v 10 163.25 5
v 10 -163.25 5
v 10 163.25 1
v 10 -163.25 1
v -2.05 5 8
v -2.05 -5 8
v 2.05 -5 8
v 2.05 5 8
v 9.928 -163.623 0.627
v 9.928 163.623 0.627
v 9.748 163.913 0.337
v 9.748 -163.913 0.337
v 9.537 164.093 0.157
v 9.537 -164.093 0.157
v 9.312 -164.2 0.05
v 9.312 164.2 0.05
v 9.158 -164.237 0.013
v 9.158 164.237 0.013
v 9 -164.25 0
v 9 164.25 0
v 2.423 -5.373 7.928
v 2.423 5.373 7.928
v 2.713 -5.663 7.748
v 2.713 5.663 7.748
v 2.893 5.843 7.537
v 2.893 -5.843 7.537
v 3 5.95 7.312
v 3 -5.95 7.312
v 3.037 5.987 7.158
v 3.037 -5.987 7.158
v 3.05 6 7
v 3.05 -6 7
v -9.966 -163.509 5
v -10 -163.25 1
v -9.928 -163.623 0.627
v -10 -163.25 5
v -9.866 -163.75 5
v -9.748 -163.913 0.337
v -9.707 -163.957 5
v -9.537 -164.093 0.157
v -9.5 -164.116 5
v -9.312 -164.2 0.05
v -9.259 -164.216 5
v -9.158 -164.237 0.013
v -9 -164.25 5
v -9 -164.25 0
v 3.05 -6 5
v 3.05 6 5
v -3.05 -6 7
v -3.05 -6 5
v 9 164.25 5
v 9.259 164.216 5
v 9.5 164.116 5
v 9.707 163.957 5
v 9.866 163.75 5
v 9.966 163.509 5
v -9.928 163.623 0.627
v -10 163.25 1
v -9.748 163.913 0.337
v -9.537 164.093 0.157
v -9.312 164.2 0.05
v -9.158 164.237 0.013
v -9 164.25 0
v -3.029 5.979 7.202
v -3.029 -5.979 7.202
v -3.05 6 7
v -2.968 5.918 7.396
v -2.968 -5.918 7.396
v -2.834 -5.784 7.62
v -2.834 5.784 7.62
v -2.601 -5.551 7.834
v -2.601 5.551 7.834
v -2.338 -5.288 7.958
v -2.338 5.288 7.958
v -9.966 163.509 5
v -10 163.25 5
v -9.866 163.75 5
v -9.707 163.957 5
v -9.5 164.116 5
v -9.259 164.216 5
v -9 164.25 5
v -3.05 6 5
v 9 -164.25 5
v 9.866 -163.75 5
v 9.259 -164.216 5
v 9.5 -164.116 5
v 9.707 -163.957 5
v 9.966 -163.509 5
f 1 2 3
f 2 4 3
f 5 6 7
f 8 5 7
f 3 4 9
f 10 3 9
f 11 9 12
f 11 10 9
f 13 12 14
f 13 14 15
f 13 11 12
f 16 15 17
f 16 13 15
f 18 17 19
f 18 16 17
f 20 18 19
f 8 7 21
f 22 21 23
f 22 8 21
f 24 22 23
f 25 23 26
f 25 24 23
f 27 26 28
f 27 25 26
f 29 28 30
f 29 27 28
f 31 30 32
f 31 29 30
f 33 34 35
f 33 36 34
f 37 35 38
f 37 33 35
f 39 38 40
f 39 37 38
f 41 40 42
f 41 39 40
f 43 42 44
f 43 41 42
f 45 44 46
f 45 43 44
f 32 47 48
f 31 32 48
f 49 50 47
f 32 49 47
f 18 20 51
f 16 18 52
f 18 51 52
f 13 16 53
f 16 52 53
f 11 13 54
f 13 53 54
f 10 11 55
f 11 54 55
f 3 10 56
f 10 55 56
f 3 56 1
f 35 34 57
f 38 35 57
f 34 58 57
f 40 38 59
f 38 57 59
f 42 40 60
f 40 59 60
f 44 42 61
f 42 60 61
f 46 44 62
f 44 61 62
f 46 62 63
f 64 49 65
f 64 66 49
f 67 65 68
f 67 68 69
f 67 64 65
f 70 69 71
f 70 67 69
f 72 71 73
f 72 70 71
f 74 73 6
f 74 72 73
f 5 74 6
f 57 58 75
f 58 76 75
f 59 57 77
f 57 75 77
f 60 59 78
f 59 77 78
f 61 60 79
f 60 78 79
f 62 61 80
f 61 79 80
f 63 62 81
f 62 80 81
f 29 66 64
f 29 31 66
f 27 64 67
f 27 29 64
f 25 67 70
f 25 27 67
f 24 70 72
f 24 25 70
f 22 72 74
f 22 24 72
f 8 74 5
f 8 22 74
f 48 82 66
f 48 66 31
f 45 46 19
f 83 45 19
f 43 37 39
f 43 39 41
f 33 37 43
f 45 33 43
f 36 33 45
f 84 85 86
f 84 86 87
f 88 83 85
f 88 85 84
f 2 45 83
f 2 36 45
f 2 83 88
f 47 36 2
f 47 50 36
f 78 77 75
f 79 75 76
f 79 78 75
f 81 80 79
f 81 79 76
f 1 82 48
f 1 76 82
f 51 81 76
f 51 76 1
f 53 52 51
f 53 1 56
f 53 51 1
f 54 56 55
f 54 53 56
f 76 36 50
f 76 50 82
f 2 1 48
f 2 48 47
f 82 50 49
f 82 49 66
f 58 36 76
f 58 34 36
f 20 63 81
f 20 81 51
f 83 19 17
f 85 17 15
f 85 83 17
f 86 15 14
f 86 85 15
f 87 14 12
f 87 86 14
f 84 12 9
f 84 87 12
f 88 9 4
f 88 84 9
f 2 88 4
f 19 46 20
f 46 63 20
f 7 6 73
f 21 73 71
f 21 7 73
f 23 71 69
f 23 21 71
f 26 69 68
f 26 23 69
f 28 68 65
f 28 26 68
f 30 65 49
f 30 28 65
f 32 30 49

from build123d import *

# Parameters (mm, degrees)
F0_W     = 20
F0_H     = 328.5
F0_W_2   = 6.1
F0_H_2   = 12
F1_DEPTH = 5
F2_DEPTH = 8
F3_R     = 1


with BuildPart() as f1:
    # F0 (on Top) → F1 (new body)
    with BuildSketch(Plane.XY):
        Rectangle(F0_W, F0_H)
        Rectangle(F0_W_2, F0_H_2, mode=Mode.SUBTRACT)
    extrude(amount=F1_DEPTH)

    # F0 (on Top) → F2 (join)
    with BuildSketch(Plane.XY):
        Rectangle(F0_W_2, F0_H_2)
    extrude(amount=F2_DEPTH)

    # F3
    f3_edges = [f1.edges().sort_by_distance(p)[0] for p in [
        (3.05, 0, 8),
        (-3.05, 0, 8),
        (0, 6, 8),
        (0, -6, 8),
        (-10, 0, 0),
        (10, 0, 0),
        (-10, -164.25, 2.5),
        (10, -164.25, 2.5),
        (10, 164.25, 2.5),
        (-10, 164.25, 2.5),
    ]]
    fillet(f3_edges, radius=F3_R)


solid = f1.part
